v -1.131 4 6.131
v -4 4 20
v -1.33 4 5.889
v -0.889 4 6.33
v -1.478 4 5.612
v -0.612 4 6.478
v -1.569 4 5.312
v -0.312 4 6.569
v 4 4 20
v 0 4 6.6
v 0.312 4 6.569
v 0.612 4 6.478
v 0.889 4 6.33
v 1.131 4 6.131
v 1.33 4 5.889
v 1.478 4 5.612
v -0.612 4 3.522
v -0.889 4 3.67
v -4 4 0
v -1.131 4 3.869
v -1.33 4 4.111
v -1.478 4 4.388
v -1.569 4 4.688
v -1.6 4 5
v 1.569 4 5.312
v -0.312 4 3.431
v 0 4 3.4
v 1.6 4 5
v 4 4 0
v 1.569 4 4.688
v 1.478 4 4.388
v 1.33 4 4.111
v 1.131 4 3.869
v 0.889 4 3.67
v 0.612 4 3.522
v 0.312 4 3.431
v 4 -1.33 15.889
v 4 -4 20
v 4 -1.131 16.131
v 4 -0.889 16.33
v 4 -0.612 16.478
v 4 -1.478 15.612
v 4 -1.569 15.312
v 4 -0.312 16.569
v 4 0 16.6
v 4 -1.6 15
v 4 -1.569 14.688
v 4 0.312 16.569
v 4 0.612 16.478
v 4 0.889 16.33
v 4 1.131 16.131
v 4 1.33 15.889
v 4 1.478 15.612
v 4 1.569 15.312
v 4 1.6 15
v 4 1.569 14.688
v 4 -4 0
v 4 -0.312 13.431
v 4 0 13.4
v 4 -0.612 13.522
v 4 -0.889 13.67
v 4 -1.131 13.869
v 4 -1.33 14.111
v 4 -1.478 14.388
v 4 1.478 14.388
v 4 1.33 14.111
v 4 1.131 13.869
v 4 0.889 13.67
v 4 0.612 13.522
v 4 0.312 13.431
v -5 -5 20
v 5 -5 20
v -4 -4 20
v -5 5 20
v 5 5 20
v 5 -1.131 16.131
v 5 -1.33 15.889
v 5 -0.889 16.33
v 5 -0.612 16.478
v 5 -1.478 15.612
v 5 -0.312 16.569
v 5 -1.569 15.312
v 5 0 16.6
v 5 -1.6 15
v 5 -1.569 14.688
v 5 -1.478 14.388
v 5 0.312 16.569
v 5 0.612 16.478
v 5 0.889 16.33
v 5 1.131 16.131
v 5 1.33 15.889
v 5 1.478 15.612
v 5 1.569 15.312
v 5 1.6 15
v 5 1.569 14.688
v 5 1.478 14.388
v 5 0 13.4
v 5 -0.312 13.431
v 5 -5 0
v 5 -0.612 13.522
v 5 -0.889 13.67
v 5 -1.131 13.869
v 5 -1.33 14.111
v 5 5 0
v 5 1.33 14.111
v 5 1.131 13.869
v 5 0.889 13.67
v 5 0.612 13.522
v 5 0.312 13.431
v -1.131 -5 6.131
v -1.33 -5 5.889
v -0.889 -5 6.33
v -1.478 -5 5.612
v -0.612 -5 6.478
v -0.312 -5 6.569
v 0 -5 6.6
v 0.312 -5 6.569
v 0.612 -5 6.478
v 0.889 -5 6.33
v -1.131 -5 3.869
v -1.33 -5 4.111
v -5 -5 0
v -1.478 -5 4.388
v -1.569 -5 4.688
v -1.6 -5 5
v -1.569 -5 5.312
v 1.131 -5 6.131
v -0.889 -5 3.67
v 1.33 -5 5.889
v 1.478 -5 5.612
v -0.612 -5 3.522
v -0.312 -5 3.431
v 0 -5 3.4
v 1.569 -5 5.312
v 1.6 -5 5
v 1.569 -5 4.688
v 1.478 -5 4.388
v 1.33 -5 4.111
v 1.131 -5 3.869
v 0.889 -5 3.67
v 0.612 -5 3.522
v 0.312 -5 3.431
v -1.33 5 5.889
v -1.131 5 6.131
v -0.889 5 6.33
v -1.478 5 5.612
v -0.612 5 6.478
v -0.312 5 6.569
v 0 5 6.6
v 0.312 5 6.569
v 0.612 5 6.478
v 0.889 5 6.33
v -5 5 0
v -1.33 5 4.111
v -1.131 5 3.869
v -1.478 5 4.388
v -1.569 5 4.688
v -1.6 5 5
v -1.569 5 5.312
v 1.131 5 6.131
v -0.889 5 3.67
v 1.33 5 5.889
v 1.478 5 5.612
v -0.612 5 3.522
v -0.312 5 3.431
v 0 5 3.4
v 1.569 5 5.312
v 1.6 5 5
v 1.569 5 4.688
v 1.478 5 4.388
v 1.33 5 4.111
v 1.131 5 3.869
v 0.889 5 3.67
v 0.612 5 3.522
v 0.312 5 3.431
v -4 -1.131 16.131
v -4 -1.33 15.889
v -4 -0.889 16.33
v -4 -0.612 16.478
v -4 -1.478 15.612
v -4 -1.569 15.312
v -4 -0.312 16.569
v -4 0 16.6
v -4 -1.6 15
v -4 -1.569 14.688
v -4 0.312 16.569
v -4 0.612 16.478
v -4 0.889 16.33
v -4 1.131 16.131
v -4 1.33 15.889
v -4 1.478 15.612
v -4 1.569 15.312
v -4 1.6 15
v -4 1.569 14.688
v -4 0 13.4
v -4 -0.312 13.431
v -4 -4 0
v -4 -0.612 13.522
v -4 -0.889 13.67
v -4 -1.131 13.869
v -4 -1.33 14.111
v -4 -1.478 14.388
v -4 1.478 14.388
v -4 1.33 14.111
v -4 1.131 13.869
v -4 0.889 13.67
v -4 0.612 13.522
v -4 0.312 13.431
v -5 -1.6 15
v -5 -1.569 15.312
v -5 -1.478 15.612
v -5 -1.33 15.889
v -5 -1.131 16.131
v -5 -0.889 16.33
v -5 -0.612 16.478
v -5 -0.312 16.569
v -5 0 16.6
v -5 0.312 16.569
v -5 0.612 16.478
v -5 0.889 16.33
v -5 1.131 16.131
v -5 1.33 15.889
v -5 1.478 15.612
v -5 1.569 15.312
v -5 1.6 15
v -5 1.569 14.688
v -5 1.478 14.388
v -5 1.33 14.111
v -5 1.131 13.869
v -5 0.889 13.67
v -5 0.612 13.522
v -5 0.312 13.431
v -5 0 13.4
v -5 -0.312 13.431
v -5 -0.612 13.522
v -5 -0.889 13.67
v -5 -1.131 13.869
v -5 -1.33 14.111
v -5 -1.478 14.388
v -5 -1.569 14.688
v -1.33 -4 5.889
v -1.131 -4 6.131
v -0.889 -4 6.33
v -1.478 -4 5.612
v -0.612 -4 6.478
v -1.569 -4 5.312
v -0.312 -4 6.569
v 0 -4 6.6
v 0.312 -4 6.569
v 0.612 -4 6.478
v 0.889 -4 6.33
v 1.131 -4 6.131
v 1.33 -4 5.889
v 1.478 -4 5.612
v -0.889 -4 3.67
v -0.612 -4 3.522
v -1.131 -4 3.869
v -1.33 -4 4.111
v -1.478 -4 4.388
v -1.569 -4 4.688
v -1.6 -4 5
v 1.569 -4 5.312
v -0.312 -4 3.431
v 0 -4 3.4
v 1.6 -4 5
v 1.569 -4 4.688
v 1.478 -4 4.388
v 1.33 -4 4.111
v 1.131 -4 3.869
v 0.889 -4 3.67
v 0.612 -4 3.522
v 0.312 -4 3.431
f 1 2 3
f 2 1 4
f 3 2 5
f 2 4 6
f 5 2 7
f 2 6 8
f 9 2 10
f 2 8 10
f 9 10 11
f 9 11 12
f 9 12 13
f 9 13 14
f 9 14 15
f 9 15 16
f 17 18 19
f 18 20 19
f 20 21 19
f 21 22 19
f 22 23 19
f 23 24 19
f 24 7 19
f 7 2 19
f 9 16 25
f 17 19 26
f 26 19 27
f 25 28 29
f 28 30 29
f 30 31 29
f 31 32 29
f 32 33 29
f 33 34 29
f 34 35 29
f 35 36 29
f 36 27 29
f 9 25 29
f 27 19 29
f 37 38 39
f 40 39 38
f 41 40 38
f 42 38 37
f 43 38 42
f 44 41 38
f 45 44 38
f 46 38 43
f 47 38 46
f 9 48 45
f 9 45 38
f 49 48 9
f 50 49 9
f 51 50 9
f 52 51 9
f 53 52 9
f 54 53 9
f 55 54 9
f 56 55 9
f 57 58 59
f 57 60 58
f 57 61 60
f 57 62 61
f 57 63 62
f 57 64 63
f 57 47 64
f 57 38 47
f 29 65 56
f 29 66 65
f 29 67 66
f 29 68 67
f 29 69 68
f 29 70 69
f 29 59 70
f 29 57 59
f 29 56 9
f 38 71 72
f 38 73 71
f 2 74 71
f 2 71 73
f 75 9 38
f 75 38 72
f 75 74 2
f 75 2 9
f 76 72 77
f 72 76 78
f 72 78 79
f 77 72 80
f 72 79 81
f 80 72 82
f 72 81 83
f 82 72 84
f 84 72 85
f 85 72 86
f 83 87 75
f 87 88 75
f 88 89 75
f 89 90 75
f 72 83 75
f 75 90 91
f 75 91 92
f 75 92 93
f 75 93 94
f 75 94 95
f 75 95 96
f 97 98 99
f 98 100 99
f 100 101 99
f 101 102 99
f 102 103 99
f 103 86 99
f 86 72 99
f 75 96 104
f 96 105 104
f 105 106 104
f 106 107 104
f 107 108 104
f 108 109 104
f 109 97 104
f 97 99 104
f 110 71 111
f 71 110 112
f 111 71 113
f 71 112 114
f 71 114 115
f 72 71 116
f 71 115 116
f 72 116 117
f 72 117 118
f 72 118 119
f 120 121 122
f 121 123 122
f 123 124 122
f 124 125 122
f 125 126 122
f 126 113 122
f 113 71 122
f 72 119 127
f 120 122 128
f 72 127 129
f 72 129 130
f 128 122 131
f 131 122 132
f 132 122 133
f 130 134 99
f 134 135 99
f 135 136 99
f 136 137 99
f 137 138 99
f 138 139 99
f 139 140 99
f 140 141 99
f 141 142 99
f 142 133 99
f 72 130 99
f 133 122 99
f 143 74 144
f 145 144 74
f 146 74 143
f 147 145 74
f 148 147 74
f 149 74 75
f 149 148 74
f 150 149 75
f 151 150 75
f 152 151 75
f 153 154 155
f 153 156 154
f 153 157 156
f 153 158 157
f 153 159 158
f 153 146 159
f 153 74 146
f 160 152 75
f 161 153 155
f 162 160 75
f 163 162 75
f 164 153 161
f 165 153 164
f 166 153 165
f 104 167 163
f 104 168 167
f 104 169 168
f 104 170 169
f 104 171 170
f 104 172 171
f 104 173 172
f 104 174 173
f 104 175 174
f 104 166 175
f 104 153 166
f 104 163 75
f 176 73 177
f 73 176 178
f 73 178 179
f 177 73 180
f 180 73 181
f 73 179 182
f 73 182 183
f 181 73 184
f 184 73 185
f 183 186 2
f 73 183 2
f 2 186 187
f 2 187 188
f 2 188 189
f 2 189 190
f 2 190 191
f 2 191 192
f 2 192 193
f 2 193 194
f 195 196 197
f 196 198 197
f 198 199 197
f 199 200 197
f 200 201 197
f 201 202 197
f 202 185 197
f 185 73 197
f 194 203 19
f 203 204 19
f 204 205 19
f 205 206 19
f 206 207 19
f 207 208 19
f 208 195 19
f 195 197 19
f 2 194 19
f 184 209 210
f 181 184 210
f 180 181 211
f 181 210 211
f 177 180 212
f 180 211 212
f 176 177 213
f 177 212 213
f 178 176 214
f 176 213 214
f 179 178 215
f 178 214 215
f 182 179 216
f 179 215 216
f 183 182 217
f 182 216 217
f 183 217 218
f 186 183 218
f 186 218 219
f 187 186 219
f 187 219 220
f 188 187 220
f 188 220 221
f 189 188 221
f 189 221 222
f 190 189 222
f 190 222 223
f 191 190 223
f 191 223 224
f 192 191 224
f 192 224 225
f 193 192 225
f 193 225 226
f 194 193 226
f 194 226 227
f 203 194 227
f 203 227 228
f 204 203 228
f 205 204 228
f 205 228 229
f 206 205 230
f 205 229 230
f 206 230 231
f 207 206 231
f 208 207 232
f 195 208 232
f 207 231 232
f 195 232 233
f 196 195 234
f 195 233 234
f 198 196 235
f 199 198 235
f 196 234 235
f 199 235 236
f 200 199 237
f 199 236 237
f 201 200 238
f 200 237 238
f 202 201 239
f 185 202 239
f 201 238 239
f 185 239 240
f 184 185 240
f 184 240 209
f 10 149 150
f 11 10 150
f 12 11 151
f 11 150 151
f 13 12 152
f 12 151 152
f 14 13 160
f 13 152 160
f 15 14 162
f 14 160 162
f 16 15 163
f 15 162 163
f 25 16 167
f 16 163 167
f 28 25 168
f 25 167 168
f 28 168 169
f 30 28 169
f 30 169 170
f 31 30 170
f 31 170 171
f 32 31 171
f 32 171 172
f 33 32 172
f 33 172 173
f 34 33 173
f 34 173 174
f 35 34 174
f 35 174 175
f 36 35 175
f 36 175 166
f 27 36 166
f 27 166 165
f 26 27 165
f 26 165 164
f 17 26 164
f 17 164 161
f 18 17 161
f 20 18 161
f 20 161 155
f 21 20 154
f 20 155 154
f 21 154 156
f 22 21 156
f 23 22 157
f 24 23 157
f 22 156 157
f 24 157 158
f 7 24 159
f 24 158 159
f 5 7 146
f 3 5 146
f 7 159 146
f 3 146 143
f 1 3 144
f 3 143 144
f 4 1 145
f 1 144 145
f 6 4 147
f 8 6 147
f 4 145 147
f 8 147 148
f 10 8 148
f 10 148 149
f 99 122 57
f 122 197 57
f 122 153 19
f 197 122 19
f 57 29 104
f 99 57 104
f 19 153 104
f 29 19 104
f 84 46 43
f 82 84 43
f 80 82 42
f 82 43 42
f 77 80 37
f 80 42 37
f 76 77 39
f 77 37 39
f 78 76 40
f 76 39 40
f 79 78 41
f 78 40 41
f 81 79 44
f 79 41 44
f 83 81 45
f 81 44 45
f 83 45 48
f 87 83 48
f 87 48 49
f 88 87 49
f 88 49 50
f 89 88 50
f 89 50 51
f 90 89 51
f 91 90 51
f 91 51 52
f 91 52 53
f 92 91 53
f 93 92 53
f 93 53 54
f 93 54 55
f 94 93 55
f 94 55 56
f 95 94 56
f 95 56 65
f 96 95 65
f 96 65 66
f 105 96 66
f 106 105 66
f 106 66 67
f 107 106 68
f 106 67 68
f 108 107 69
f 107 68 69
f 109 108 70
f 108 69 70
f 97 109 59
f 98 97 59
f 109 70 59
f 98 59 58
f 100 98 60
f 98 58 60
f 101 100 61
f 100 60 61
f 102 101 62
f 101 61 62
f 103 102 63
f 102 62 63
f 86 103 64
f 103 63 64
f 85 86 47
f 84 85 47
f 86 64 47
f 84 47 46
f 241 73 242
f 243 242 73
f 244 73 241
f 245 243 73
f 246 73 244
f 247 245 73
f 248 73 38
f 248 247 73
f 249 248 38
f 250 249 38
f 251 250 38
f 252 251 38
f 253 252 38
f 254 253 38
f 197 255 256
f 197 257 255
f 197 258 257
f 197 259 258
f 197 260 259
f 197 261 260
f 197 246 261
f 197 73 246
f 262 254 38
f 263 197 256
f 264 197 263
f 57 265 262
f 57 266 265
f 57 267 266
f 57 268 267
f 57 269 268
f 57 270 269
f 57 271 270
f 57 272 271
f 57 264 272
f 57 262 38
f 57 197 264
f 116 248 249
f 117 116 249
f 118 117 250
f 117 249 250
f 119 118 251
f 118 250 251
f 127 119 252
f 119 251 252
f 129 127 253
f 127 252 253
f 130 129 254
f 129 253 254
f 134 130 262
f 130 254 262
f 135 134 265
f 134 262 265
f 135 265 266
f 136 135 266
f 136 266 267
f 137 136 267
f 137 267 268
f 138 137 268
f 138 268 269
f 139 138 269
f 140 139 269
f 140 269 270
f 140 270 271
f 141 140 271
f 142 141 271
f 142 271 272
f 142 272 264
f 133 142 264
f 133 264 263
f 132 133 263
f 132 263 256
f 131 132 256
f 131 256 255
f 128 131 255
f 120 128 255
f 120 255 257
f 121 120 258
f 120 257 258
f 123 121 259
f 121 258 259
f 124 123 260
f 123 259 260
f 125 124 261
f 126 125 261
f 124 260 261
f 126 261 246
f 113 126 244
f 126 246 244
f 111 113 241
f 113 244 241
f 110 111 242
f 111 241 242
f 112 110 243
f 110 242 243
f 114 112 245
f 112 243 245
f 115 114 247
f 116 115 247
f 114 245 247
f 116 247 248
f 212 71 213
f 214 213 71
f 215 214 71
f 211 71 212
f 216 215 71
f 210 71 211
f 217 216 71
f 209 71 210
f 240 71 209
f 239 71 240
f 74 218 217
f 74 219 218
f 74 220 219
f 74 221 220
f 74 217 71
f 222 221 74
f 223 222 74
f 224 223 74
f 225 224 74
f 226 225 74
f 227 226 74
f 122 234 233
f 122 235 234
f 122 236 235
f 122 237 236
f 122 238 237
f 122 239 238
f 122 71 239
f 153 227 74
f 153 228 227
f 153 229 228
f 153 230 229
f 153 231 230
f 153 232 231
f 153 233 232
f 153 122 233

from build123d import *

# Parameters (mm, degrees)
SKETCH_1_W          = 10
SKETCH_1_H          = 10
SKETCH_1_W_2        = 8
SKETCH_1_H_2        = 8
EXTRUDE_1_DEPTH     = 20
SKETCH_3_R          = 1.6
CUT_EXTRUDE_1_DEPTH = 23.912878475
SKETCH_4_R          = 1.6
CUT_EXTRUDE_2_DEPTH = 23.912878475


with BuildPart() as part:
    # ｽｹｯﾁ1 → ﾎﾞｽ - 押し出し1 (new body)
    with BuildSketch(Plane.XY):
        Rectangle(SKETCH_1_W, SKETCH_1_H)
        Rectangle(SKETCH_1_W_2, SKETCH_1_H_2, mode=Mode.SUBTRACT)
    extrude(amount=EXTRUDE_1_DEPTH)

    # ｽｹｯﾁ3 → ｶｯﾄ - 押し出し1 (cut, through all)
    with BuildSketch(Plane(origin=(0, 5, 0), x_dir=(1, 0, 0), z_dir=(0, 1, 0))):
        with Locations(Location((0, -5, 0), (0, 0, 270))):
            Circle(SKETCH_3_R)
    extrude(amount=-CUT_EXTRUDE_1_DEPTH, mode=Mode.SUBTRACT)

    # ｽｹｯﾁ4 → ｶｯﾄ - 押し出し2 (cut, through all)
    with BuildSketch(Plane.ZY.offset(5)):
        with Locations(Location((15, 0, 0), (0, 0, 270))):
            Circle(SKETCH_4_R)
    extrude(amount=-CUT_EXTRUDE_2_DEPTH, mode=Mode.SUBTRACT)


solid = part.part
